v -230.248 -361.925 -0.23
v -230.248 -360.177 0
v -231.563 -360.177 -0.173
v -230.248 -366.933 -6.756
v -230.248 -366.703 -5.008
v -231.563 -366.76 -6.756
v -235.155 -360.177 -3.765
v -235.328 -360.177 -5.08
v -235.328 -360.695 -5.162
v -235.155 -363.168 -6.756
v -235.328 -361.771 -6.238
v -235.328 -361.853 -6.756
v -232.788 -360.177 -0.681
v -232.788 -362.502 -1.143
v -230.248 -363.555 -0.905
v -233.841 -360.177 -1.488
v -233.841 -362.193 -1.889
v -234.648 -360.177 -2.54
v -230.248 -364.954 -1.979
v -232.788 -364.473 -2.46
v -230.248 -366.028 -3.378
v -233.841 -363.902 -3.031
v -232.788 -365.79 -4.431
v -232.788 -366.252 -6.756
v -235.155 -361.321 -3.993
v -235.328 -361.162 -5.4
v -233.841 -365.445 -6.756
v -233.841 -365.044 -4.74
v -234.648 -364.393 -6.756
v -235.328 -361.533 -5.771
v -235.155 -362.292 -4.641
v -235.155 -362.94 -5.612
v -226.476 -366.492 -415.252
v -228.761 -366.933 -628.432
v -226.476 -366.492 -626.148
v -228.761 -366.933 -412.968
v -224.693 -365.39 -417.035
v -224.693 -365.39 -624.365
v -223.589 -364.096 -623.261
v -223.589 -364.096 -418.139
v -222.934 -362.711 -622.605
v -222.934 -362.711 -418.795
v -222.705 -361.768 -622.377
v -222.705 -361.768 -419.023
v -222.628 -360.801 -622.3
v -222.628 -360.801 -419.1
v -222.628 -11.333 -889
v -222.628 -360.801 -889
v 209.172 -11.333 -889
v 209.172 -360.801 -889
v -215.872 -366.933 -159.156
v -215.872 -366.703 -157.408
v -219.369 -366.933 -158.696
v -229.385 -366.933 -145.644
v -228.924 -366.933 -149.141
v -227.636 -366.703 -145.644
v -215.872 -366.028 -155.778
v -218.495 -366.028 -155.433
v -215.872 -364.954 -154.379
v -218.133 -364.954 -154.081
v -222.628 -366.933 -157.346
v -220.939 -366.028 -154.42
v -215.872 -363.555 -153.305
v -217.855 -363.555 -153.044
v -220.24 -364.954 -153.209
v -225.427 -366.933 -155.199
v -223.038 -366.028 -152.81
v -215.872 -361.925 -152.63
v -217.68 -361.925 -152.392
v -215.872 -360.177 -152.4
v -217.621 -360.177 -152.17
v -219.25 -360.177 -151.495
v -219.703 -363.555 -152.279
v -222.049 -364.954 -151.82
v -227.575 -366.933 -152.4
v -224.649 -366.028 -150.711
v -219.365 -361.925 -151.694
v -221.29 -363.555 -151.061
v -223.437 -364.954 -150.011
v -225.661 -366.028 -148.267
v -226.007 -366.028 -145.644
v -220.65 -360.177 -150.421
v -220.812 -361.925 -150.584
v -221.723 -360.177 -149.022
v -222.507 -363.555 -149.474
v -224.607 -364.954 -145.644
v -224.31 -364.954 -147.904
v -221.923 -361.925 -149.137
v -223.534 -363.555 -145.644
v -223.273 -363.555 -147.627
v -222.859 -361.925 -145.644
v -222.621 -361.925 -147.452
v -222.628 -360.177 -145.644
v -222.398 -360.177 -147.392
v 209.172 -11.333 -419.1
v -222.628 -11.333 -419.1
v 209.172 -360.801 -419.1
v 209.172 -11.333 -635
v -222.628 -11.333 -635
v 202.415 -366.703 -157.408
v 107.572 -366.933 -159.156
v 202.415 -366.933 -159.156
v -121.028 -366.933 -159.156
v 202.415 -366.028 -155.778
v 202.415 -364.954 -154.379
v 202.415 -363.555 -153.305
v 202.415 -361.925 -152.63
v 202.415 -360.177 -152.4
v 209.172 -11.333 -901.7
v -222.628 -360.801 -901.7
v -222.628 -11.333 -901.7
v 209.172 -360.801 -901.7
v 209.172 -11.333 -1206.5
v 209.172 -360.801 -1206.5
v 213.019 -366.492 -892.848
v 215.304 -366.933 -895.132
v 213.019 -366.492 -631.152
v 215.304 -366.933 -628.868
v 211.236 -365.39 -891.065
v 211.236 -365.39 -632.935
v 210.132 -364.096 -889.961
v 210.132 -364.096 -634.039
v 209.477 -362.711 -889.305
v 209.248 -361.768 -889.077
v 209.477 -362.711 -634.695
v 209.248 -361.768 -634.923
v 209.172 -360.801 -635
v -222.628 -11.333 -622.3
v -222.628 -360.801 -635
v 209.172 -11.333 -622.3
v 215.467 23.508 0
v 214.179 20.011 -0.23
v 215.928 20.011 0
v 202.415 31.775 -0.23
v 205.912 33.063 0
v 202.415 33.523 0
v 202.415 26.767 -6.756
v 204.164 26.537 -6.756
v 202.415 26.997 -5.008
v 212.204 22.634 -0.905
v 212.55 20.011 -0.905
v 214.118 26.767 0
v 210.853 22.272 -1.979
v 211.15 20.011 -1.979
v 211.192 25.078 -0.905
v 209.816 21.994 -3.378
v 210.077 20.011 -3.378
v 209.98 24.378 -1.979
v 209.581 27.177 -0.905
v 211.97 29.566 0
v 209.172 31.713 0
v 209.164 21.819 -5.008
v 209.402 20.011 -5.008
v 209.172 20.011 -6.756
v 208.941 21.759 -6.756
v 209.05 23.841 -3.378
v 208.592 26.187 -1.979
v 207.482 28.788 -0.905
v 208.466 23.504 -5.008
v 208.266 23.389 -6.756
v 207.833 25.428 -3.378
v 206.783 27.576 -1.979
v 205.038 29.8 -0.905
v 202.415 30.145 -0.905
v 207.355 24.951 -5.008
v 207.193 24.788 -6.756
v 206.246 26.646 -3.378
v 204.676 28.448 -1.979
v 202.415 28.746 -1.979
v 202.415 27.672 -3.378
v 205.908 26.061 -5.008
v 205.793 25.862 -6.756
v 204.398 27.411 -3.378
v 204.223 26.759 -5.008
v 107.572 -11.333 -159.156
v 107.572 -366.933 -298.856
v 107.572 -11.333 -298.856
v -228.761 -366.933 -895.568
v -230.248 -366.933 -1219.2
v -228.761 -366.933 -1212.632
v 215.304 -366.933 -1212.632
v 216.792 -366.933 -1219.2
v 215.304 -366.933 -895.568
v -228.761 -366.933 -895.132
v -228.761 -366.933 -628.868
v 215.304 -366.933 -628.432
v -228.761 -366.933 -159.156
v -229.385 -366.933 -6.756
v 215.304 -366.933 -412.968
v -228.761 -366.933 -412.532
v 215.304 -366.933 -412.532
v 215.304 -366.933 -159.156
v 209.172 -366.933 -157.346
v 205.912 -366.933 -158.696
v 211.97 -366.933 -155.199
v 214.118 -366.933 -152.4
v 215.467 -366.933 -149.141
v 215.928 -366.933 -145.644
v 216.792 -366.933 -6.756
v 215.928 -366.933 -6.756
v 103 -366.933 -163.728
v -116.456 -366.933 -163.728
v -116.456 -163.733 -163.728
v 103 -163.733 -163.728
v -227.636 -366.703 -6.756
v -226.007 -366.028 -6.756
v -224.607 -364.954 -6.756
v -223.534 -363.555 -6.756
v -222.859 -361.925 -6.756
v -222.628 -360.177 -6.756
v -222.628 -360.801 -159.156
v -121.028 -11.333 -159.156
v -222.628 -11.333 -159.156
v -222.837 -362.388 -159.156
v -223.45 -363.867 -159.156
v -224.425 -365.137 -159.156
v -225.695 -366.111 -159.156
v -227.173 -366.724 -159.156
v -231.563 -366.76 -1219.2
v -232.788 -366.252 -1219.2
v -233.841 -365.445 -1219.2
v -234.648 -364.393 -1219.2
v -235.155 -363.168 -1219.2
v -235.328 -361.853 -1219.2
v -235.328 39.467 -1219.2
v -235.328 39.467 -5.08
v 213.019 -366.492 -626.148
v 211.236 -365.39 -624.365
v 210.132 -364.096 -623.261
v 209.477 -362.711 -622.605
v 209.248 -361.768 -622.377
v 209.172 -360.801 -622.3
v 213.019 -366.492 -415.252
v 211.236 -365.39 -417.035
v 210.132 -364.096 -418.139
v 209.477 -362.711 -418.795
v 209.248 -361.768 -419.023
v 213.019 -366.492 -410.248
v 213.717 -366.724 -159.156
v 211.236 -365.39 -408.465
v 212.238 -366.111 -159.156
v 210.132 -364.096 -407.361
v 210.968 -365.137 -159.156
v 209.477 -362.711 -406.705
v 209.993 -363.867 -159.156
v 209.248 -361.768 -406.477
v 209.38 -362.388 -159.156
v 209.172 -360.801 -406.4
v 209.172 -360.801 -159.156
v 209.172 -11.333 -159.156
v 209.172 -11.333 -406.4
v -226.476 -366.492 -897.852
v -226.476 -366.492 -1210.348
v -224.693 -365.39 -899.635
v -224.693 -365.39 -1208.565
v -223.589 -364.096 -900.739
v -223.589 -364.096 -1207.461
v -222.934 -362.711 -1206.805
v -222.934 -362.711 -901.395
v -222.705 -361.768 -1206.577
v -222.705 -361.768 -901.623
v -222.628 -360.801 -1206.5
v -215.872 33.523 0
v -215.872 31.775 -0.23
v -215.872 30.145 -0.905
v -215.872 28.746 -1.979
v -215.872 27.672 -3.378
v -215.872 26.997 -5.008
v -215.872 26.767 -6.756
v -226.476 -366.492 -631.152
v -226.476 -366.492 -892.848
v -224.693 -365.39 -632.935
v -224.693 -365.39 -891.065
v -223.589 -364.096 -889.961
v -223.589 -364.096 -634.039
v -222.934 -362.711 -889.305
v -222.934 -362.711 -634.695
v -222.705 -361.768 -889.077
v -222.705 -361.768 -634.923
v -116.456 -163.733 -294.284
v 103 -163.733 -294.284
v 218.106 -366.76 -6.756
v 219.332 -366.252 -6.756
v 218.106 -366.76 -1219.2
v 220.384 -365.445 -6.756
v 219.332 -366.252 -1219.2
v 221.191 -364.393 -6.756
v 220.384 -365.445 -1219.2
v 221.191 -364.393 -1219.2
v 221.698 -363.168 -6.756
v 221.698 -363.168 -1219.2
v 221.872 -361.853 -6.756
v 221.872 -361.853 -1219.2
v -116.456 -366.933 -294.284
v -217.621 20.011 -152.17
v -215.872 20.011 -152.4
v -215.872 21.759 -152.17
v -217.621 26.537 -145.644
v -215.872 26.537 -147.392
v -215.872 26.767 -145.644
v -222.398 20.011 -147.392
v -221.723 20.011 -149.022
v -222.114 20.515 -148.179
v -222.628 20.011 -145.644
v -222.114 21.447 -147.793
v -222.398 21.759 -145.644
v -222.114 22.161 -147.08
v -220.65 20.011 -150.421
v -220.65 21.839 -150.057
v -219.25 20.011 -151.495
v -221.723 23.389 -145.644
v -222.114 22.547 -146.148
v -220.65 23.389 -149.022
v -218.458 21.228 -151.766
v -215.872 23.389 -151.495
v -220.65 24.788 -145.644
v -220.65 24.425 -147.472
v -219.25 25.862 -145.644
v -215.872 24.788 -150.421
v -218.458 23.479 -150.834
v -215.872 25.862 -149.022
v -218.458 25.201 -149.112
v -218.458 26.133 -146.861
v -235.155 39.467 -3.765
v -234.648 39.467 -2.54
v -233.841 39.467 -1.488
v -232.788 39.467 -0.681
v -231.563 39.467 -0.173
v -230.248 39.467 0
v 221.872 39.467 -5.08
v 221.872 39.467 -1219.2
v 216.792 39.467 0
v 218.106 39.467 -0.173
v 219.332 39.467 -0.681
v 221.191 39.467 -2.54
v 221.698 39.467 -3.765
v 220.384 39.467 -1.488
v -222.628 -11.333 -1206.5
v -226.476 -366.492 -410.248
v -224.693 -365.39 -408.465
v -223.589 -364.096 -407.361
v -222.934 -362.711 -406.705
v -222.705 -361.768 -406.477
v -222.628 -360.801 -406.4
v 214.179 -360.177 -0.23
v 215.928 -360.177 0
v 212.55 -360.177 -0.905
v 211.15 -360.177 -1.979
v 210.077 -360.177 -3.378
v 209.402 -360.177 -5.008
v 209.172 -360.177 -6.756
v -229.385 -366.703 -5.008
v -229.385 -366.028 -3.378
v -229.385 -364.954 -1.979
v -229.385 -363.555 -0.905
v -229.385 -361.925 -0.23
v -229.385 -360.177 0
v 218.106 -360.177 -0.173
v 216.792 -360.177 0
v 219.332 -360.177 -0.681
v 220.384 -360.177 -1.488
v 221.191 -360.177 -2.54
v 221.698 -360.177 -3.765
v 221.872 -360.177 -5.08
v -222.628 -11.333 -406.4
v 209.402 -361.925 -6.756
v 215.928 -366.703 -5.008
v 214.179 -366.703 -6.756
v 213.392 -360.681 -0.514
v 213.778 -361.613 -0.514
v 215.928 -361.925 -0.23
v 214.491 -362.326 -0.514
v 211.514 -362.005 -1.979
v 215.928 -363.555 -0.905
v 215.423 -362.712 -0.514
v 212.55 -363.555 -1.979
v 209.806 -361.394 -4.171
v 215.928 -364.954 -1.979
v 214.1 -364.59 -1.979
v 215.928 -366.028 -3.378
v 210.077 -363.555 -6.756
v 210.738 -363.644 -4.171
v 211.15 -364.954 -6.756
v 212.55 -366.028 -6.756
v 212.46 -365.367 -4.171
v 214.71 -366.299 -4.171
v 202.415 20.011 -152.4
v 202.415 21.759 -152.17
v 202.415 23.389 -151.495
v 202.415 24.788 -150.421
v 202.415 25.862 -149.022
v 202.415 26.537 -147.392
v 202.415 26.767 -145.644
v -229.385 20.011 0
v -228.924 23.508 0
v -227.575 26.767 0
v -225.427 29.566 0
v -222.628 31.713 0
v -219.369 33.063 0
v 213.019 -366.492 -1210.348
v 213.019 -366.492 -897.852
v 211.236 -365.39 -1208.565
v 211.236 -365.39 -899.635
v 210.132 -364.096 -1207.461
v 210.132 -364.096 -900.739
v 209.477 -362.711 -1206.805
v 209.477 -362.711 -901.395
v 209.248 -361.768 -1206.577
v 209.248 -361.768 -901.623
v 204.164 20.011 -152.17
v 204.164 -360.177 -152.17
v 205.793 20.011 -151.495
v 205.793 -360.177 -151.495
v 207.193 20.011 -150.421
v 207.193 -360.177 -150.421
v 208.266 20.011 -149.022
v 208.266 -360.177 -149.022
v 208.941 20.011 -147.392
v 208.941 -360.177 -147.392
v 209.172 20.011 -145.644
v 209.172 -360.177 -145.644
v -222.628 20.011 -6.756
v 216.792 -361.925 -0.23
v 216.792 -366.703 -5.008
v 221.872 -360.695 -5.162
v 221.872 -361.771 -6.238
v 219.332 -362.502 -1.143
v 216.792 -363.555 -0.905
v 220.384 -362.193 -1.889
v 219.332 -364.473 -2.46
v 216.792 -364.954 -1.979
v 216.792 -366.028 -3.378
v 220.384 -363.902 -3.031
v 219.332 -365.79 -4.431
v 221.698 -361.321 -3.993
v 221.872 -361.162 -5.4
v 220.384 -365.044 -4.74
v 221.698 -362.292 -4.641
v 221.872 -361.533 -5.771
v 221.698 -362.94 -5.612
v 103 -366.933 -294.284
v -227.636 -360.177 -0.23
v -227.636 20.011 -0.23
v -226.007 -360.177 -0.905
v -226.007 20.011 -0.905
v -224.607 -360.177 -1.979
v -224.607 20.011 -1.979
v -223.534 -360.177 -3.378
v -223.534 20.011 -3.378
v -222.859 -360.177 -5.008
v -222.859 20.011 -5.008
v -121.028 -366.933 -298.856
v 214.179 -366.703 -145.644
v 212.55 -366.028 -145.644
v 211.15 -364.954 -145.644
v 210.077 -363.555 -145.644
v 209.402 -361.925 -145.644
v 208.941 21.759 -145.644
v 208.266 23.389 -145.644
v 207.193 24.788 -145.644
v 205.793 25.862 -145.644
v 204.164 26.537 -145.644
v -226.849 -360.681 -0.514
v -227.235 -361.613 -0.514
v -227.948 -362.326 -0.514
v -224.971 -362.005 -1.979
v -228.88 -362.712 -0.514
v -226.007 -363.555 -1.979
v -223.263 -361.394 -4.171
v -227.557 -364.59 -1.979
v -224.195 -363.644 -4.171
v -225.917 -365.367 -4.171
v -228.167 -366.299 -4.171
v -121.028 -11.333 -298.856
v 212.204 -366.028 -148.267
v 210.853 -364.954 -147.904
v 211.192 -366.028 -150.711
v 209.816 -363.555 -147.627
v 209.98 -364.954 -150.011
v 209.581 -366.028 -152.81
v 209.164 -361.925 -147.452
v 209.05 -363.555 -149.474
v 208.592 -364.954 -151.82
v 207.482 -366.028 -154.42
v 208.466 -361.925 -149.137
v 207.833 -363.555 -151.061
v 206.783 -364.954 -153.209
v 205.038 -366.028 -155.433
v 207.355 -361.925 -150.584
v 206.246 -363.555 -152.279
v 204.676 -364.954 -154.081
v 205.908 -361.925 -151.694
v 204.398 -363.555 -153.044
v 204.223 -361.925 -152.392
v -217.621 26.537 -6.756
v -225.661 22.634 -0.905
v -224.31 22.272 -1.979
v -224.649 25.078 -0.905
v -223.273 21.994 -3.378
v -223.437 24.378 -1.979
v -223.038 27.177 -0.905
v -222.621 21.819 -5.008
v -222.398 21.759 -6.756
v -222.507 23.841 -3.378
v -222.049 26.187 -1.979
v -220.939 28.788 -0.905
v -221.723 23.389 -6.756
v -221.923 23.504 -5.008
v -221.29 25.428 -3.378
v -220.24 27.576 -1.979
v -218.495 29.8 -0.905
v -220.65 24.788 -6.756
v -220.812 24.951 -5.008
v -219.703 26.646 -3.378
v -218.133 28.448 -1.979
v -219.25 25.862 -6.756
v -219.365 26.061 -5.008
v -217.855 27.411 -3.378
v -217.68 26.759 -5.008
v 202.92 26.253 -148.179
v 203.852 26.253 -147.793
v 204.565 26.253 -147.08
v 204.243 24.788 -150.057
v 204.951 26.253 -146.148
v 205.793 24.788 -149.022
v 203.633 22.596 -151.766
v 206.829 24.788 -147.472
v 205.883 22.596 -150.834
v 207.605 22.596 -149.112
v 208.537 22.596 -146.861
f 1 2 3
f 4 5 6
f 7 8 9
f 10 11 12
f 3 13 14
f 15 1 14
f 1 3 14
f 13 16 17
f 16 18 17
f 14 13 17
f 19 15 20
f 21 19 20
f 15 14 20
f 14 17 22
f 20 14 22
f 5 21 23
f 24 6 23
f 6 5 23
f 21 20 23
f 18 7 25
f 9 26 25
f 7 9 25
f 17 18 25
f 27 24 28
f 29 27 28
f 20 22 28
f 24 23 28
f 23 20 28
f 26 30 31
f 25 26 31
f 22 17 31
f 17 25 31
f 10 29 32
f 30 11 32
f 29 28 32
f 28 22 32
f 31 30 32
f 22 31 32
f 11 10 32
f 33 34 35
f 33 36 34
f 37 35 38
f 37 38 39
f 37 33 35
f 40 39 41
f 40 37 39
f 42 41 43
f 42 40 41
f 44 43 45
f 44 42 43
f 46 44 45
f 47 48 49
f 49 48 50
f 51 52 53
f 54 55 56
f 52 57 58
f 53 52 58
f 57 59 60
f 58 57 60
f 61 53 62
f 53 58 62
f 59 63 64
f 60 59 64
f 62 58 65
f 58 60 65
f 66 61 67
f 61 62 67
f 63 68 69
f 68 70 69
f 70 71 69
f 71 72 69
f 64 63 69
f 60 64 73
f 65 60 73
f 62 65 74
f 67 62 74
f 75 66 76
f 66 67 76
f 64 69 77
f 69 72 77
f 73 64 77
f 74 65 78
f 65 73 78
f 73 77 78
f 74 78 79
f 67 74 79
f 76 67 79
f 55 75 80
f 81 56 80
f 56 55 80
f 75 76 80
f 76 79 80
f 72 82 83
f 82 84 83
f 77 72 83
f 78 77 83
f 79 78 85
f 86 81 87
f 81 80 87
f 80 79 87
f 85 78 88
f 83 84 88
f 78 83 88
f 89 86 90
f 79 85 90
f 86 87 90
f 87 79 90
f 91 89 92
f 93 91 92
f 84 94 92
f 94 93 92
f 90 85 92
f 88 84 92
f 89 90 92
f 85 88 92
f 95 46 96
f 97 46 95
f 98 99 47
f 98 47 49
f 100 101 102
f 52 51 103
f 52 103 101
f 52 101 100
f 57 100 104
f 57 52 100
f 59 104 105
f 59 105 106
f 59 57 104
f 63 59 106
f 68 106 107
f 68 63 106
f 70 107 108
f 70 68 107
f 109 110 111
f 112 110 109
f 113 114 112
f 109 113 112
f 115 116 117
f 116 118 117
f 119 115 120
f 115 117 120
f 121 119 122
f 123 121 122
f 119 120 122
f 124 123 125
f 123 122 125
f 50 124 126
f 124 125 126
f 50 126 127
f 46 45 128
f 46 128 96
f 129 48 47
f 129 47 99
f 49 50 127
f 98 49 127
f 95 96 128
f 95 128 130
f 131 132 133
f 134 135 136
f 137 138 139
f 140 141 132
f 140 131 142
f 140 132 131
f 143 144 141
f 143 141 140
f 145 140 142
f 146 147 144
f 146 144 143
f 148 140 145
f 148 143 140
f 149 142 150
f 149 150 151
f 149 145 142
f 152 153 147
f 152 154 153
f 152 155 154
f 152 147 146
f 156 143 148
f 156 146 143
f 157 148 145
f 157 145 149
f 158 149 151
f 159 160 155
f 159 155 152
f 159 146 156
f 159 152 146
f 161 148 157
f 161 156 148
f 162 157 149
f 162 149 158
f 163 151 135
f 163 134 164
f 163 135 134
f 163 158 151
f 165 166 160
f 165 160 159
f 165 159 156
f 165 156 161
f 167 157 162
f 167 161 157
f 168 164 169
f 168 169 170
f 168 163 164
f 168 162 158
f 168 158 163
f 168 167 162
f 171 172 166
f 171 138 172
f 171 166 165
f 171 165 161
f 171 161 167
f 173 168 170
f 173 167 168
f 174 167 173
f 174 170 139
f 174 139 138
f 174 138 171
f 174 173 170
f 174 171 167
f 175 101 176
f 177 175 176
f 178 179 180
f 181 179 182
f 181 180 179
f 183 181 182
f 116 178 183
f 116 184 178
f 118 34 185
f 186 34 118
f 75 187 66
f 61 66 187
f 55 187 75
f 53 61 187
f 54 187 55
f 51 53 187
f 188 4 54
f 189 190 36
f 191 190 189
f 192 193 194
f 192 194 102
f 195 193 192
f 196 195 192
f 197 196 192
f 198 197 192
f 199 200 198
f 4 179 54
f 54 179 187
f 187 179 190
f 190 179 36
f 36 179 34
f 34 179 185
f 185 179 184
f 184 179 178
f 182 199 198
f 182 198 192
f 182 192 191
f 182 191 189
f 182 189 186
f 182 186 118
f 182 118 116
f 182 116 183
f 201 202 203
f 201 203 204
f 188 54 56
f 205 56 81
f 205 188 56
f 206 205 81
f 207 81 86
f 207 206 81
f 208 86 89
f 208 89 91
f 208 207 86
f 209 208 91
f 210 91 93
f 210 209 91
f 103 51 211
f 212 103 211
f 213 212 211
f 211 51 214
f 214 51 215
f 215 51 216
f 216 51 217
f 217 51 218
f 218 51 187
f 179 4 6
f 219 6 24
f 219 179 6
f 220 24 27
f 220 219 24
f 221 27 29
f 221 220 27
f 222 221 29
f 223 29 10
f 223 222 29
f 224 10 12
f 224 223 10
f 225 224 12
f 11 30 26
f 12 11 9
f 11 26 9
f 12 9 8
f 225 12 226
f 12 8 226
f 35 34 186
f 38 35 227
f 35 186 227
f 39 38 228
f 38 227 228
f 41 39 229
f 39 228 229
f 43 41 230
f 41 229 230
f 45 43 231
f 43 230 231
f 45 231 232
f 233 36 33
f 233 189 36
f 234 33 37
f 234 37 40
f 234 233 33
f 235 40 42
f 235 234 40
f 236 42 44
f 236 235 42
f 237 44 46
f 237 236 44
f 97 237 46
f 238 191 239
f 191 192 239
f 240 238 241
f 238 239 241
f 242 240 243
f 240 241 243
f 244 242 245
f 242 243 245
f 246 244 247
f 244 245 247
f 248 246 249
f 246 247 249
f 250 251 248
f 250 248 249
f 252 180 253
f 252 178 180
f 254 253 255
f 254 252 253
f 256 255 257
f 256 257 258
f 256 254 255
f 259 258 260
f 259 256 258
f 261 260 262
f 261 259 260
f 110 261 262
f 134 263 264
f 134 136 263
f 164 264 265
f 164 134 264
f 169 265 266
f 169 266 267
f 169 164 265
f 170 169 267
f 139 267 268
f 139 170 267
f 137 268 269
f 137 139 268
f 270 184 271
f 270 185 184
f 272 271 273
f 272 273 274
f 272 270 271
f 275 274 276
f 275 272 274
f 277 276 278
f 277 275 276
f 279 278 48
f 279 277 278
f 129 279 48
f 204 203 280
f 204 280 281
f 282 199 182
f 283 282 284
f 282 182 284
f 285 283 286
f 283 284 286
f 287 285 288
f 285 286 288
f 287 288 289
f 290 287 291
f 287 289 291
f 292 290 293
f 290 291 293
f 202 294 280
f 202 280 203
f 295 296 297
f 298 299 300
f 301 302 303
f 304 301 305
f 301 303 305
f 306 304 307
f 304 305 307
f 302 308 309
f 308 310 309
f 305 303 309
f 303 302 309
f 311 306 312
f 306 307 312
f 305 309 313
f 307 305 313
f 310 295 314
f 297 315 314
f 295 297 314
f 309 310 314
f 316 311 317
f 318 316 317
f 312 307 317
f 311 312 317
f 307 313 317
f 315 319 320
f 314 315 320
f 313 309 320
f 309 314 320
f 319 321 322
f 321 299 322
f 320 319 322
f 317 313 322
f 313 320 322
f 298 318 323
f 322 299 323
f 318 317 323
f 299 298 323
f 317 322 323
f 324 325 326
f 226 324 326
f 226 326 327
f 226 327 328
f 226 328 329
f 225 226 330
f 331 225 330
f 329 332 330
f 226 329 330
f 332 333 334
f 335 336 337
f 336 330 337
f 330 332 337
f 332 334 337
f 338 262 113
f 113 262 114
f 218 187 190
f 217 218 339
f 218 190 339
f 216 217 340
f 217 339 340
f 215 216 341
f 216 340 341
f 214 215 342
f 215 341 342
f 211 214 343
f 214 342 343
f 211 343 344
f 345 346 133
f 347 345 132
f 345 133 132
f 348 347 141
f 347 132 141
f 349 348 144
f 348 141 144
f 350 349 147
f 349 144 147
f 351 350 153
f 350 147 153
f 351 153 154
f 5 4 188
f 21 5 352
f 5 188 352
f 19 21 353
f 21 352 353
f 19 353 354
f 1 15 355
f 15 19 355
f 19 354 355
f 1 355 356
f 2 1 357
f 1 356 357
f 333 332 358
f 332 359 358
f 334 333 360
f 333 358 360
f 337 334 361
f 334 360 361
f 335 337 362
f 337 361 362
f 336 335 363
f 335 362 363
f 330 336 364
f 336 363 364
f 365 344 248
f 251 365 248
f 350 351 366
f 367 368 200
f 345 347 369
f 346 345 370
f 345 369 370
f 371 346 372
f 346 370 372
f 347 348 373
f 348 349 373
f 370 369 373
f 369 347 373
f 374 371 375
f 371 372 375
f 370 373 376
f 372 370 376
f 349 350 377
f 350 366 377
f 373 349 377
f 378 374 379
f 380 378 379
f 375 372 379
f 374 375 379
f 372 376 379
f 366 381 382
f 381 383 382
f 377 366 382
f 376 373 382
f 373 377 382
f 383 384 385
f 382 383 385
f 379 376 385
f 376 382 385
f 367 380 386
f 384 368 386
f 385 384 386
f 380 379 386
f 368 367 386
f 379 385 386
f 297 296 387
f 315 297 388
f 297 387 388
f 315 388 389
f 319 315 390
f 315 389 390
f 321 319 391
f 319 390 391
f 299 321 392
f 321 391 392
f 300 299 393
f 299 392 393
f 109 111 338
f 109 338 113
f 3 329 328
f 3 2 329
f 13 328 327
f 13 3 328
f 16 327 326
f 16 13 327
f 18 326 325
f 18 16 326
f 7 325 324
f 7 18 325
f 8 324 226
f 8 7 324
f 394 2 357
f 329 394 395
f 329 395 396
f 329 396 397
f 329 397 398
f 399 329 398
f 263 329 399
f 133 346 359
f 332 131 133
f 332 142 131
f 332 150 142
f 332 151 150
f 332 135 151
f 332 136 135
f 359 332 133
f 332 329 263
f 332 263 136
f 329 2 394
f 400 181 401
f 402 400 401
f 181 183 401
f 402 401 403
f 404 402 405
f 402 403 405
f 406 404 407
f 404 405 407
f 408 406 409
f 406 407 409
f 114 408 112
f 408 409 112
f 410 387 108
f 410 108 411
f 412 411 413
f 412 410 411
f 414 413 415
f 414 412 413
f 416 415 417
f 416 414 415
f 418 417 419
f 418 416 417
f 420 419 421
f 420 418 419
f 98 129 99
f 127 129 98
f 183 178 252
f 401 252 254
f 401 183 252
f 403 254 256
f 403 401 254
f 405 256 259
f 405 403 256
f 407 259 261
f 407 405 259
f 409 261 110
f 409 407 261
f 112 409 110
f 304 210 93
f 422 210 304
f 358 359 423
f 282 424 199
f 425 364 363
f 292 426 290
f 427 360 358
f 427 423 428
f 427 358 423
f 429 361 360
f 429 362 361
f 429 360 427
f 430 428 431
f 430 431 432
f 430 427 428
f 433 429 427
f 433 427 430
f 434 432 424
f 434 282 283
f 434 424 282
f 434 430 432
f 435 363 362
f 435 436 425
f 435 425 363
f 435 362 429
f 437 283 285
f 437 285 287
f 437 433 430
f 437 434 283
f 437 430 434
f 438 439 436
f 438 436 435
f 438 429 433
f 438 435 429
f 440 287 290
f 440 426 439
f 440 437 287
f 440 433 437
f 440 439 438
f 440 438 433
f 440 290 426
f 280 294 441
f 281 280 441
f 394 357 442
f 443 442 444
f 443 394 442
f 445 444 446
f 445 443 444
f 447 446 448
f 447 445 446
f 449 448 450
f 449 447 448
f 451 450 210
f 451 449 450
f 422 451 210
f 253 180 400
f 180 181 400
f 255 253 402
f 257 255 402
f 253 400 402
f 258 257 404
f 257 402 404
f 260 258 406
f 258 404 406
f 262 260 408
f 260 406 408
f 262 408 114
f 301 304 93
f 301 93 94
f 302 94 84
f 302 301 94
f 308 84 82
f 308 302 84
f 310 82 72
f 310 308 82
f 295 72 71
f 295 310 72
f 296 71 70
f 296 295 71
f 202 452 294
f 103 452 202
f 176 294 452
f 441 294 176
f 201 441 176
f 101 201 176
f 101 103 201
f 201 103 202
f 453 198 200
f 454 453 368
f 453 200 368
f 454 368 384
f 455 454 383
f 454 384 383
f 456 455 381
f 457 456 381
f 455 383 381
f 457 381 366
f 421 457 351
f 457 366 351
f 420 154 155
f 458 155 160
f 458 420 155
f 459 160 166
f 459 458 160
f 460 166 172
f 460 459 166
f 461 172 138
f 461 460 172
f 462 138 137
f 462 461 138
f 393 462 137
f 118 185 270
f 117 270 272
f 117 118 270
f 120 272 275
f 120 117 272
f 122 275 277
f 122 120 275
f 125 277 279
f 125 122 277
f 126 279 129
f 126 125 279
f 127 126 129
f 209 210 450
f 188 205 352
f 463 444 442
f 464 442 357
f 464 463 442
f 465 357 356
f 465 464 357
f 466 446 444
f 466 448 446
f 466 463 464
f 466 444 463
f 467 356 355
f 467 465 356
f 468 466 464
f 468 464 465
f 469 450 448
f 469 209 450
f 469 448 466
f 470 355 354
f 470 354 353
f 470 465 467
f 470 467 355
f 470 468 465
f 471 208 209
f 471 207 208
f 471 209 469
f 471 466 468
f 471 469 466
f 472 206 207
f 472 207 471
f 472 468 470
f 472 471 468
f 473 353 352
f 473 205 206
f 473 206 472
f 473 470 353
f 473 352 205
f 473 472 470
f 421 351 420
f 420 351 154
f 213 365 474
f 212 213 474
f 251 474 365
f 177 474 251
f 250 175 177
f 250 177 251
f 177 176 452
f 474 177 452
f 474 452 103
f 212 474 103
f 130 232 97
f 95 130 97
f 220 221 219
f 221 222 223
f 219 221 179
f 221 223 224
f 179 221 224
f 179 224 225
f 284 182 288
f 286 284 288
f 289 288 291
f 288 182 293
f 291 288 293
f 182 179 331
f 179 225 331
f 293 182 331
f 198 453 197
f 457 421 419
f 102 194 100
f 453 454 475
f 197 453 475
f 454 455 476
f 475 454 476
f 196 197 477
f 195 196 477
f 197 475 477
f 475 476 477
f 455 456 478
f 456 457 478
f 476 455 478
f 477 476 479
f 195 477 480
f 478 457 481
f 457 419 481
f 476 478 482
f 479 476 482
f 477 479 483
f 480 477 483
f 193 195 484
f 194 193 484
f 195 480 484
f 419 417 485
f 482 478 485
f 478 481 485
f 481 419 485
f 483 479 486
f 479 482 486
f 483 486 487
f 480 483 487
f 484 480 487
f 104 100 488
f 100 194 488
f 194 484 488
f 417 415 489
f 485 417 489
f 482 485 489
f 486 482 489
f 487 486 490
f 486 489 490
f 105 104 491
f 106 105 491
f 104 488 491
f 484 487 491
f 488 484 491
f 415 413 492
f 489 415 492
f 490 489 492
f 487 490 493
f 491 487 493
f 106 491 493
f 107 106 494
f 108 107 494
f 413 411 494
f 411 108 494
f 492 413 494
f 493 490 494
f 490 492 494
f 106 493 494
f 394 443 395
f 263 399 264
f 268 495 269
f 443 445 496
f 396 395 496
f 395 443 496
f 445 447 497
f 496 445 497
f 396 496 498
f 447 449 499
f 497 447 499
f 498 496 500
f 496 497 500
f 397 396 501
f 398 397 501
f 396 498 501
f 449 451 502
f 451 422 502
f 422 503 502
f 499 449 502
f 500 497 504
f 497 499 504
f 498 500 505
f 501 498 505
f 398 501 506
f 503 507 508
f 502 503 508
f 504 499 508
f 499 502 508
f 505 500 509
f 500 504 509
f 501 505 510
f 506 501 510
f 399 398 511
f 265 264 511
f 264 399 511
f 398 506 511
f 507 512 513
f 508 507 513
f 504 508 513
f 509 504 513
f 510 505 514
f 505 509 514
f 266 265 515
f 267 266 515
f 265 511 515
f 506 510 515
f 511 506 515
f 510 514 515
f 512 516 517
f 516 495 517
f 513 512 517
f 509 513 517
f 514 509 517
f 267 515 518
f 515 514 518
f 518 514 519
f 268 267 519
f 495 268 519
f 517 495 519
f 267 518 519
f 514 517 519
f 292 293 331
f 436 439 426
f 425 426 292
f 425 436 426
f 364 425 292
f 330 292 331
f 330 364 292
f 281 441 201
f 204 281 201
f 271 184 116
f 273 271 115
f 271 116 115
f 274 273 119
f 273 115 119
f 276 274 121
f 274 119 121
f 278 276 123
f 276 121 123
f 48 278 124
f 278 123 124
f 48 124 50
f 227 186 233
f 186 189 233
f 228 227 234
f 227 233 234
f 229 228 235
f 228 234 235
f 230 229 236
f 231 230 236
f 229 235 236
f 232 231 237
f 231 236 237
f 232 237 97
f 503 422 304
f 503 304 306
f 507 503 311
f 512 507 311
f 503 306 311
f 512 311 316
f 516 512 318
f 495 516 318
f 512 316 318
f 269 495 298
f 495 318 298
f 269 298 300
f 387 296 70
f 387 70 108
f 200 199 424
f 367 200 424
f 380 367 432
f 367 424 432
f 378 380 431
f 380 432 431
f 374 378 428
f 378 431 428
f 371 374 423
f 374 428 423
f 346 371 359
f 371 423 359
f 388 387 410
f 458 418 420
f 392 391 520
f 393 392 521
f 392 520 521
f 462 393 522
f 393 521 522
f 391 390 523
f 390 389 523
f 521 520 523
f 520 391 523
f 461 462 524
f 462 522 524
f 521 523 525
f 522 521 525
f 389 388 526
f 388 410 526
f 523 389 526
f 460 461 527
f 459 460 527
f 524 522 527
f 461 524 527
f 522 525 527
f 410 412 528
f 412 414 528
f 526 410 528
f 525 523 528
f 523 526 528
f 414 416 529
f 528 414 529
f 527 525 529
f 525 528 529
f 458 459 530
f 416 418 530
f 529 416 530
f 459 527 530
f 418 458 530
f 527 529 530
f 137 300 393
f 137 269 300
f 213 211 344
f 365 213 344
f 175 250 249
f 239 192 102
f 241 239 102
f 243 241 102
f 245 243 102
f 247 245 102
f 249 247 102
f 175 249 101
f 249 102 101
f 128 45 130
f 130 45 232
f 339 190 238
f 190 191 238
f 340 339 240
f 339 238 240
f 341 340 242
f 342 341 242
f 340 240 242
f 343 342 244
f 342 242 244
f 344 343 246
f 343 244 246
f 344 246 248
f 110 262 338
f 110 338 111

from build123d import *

# Parameters (mm, degrees)
F0_W      = 457.2
F0_H      = 406.4
F1_DEPTH  = 1219.2
F2_W      = 431.8
F2_H      = 402.8296259509
F3_DEPTH  = 152.4
F4_R      = 6.7564
F5_W      = 431.8
F5_H      = 304.8
F6_DEPTH  = 355.6
F7_W      = 431.8
F7_H      = 254
F7_H_2    = 203.2
F8_DEPTH  = 355.6
F9_R      = 6.1321024484
F10_W     = 219.456
F10_H     = 130.556
F11_DEPTH = 203.2
F12_R     = 5.08


with BuildPart() as f1:
    # F0 (on Top) → F1 (new body)
    with BuildSketch(Plane.XY):
        with Locations((-6.7284821169, -163.7329156511)):
            Rectangle(F0_W, F0_H)
    extrude(amount=-F1_DEPTH)

    # F2 (on face) → F3 (cut)
    with BuildSketch(Plane.XY):
        with Locations((-6.7284821169, -174.6477286265)):
            Rectangle(F2_W, F2_H)
    extrude(amount=-F3_DEPTH, mode=Mode.SUBTRACT)

    # F4
    f4_edges = [f1.edges().sort_by_distance(p)[0] for p in [
        (209.171518, -170.082916, -152.4),
        (-6.728482, 26.767084, -152.4),
        (209.171518, 26.767084, -76.2),
        (209.171518, -366.932916, -76.2),
        (209.171518, -170.082916, 0),
        (215.521518, -366.932916, 0),
        (-222.628482, -170.082916, -152.4),
        (-222.628482, 26.767084, -76.2),
        (-6.728482, -366.932916, -152.4),
        (-222.628482, -366.932916, -76.2),
        (-222.628482, -170.082916, 0),
        (-228.978482, -366.932916, 0),
        (-6.728482, 26.767084, 0),
    ]]
    fillet(f4_edges, radius=F4_R)

    # F5 (on face) → F6 (cut)
    with BuildSketch(Plane.XZ.offset(366.9329156511)):
        with Locations((-6.7284821169, -1054.1)):
            Rectangle(F5_W, F5_H)
    extrude(amount=-F6_DEPTH, mode=Mode.SUBTRACT)

    # F7 (on face) → F8 (cut)
    with BuildSketch(Plane.XZ.offset(366.9329156511)):
        with Locations((-6.7284821169, -762)):
            Rectangle(F7_W, F7_H)
        with Locations((-6.7284821169, -520.7)):
            Rectangle(F7_W, F7_H_2)
        Polygon((-121.0284821169, -298.8564), (-121.0284821169, -159.1564), (-222.6284821169, -159.1564), (-222.6284821169, -406.4), (209.1715178831, -406.4), (209.1715178831, -159.1564), (107.5715178831, -159.1564), (107.5715178831, -298.8564), align=None)
    extrude(amount=-F8_DEPTH, mode=Mode.SUBTRACT)

    # F9
    f9_edges = [f1.edges().sort_by_distance(p)[0] for p in [
        (-222.628482, -366.932916, -520.7),
        (209.171518, -366.932916, -520.7),
        (-222.628482, -366.932916, -282.7782),
        (209.171518, -366.932916, -282.7782),
        (209.171518, -366.932916, -762),
        (-222.628482, -366.932916, -762),
        (-222.628482, -366.932916, -1054.1),
        (209.171518, -366.932916, -1054.1),
        (-6.728482, -366.932916, -1206.5),
        (-6.728482, -366.932916, -889),
        (-6.728482, -366.932916, -901.7),
        (-6.728482, -366.932916, -635),
        (-6.728482, -366.932916, -622.3),
        (-6.728482, -366.932916, -419.1),
        (-6.728482, -366.932916, -406.4),
    ]]
    fillet(f9_edges, radius=F9_R)

    # F10 (on face) → F11 (cut)
    with BuildSketch(Plane.XZ.offset(366.9329156511)):
        with Locations((-6.7284821169, -229.0064)):
            Rectangle(F10_W, F10_H)
    extrude(amount=-F11_DEPTH, mode=Mode.SUBTRACT)

    # F12
    f12_edges = [f1.edges().sort_by_distance(p)[0] for p in [
        (-235.328482, -366.932916, -612.9782),
        (221.871518, -366.932916, -612.9782),
        (221.871518, -160.354716, 0),
        (-235.328482, -160.354716, 0),
        (221.871518, -364.954012, -1.978904),
        (-235.328482, -364.954012, -1.978904),
    ]]
    fillet(f12_edges, radius=F12_R)


solid = f1.part
